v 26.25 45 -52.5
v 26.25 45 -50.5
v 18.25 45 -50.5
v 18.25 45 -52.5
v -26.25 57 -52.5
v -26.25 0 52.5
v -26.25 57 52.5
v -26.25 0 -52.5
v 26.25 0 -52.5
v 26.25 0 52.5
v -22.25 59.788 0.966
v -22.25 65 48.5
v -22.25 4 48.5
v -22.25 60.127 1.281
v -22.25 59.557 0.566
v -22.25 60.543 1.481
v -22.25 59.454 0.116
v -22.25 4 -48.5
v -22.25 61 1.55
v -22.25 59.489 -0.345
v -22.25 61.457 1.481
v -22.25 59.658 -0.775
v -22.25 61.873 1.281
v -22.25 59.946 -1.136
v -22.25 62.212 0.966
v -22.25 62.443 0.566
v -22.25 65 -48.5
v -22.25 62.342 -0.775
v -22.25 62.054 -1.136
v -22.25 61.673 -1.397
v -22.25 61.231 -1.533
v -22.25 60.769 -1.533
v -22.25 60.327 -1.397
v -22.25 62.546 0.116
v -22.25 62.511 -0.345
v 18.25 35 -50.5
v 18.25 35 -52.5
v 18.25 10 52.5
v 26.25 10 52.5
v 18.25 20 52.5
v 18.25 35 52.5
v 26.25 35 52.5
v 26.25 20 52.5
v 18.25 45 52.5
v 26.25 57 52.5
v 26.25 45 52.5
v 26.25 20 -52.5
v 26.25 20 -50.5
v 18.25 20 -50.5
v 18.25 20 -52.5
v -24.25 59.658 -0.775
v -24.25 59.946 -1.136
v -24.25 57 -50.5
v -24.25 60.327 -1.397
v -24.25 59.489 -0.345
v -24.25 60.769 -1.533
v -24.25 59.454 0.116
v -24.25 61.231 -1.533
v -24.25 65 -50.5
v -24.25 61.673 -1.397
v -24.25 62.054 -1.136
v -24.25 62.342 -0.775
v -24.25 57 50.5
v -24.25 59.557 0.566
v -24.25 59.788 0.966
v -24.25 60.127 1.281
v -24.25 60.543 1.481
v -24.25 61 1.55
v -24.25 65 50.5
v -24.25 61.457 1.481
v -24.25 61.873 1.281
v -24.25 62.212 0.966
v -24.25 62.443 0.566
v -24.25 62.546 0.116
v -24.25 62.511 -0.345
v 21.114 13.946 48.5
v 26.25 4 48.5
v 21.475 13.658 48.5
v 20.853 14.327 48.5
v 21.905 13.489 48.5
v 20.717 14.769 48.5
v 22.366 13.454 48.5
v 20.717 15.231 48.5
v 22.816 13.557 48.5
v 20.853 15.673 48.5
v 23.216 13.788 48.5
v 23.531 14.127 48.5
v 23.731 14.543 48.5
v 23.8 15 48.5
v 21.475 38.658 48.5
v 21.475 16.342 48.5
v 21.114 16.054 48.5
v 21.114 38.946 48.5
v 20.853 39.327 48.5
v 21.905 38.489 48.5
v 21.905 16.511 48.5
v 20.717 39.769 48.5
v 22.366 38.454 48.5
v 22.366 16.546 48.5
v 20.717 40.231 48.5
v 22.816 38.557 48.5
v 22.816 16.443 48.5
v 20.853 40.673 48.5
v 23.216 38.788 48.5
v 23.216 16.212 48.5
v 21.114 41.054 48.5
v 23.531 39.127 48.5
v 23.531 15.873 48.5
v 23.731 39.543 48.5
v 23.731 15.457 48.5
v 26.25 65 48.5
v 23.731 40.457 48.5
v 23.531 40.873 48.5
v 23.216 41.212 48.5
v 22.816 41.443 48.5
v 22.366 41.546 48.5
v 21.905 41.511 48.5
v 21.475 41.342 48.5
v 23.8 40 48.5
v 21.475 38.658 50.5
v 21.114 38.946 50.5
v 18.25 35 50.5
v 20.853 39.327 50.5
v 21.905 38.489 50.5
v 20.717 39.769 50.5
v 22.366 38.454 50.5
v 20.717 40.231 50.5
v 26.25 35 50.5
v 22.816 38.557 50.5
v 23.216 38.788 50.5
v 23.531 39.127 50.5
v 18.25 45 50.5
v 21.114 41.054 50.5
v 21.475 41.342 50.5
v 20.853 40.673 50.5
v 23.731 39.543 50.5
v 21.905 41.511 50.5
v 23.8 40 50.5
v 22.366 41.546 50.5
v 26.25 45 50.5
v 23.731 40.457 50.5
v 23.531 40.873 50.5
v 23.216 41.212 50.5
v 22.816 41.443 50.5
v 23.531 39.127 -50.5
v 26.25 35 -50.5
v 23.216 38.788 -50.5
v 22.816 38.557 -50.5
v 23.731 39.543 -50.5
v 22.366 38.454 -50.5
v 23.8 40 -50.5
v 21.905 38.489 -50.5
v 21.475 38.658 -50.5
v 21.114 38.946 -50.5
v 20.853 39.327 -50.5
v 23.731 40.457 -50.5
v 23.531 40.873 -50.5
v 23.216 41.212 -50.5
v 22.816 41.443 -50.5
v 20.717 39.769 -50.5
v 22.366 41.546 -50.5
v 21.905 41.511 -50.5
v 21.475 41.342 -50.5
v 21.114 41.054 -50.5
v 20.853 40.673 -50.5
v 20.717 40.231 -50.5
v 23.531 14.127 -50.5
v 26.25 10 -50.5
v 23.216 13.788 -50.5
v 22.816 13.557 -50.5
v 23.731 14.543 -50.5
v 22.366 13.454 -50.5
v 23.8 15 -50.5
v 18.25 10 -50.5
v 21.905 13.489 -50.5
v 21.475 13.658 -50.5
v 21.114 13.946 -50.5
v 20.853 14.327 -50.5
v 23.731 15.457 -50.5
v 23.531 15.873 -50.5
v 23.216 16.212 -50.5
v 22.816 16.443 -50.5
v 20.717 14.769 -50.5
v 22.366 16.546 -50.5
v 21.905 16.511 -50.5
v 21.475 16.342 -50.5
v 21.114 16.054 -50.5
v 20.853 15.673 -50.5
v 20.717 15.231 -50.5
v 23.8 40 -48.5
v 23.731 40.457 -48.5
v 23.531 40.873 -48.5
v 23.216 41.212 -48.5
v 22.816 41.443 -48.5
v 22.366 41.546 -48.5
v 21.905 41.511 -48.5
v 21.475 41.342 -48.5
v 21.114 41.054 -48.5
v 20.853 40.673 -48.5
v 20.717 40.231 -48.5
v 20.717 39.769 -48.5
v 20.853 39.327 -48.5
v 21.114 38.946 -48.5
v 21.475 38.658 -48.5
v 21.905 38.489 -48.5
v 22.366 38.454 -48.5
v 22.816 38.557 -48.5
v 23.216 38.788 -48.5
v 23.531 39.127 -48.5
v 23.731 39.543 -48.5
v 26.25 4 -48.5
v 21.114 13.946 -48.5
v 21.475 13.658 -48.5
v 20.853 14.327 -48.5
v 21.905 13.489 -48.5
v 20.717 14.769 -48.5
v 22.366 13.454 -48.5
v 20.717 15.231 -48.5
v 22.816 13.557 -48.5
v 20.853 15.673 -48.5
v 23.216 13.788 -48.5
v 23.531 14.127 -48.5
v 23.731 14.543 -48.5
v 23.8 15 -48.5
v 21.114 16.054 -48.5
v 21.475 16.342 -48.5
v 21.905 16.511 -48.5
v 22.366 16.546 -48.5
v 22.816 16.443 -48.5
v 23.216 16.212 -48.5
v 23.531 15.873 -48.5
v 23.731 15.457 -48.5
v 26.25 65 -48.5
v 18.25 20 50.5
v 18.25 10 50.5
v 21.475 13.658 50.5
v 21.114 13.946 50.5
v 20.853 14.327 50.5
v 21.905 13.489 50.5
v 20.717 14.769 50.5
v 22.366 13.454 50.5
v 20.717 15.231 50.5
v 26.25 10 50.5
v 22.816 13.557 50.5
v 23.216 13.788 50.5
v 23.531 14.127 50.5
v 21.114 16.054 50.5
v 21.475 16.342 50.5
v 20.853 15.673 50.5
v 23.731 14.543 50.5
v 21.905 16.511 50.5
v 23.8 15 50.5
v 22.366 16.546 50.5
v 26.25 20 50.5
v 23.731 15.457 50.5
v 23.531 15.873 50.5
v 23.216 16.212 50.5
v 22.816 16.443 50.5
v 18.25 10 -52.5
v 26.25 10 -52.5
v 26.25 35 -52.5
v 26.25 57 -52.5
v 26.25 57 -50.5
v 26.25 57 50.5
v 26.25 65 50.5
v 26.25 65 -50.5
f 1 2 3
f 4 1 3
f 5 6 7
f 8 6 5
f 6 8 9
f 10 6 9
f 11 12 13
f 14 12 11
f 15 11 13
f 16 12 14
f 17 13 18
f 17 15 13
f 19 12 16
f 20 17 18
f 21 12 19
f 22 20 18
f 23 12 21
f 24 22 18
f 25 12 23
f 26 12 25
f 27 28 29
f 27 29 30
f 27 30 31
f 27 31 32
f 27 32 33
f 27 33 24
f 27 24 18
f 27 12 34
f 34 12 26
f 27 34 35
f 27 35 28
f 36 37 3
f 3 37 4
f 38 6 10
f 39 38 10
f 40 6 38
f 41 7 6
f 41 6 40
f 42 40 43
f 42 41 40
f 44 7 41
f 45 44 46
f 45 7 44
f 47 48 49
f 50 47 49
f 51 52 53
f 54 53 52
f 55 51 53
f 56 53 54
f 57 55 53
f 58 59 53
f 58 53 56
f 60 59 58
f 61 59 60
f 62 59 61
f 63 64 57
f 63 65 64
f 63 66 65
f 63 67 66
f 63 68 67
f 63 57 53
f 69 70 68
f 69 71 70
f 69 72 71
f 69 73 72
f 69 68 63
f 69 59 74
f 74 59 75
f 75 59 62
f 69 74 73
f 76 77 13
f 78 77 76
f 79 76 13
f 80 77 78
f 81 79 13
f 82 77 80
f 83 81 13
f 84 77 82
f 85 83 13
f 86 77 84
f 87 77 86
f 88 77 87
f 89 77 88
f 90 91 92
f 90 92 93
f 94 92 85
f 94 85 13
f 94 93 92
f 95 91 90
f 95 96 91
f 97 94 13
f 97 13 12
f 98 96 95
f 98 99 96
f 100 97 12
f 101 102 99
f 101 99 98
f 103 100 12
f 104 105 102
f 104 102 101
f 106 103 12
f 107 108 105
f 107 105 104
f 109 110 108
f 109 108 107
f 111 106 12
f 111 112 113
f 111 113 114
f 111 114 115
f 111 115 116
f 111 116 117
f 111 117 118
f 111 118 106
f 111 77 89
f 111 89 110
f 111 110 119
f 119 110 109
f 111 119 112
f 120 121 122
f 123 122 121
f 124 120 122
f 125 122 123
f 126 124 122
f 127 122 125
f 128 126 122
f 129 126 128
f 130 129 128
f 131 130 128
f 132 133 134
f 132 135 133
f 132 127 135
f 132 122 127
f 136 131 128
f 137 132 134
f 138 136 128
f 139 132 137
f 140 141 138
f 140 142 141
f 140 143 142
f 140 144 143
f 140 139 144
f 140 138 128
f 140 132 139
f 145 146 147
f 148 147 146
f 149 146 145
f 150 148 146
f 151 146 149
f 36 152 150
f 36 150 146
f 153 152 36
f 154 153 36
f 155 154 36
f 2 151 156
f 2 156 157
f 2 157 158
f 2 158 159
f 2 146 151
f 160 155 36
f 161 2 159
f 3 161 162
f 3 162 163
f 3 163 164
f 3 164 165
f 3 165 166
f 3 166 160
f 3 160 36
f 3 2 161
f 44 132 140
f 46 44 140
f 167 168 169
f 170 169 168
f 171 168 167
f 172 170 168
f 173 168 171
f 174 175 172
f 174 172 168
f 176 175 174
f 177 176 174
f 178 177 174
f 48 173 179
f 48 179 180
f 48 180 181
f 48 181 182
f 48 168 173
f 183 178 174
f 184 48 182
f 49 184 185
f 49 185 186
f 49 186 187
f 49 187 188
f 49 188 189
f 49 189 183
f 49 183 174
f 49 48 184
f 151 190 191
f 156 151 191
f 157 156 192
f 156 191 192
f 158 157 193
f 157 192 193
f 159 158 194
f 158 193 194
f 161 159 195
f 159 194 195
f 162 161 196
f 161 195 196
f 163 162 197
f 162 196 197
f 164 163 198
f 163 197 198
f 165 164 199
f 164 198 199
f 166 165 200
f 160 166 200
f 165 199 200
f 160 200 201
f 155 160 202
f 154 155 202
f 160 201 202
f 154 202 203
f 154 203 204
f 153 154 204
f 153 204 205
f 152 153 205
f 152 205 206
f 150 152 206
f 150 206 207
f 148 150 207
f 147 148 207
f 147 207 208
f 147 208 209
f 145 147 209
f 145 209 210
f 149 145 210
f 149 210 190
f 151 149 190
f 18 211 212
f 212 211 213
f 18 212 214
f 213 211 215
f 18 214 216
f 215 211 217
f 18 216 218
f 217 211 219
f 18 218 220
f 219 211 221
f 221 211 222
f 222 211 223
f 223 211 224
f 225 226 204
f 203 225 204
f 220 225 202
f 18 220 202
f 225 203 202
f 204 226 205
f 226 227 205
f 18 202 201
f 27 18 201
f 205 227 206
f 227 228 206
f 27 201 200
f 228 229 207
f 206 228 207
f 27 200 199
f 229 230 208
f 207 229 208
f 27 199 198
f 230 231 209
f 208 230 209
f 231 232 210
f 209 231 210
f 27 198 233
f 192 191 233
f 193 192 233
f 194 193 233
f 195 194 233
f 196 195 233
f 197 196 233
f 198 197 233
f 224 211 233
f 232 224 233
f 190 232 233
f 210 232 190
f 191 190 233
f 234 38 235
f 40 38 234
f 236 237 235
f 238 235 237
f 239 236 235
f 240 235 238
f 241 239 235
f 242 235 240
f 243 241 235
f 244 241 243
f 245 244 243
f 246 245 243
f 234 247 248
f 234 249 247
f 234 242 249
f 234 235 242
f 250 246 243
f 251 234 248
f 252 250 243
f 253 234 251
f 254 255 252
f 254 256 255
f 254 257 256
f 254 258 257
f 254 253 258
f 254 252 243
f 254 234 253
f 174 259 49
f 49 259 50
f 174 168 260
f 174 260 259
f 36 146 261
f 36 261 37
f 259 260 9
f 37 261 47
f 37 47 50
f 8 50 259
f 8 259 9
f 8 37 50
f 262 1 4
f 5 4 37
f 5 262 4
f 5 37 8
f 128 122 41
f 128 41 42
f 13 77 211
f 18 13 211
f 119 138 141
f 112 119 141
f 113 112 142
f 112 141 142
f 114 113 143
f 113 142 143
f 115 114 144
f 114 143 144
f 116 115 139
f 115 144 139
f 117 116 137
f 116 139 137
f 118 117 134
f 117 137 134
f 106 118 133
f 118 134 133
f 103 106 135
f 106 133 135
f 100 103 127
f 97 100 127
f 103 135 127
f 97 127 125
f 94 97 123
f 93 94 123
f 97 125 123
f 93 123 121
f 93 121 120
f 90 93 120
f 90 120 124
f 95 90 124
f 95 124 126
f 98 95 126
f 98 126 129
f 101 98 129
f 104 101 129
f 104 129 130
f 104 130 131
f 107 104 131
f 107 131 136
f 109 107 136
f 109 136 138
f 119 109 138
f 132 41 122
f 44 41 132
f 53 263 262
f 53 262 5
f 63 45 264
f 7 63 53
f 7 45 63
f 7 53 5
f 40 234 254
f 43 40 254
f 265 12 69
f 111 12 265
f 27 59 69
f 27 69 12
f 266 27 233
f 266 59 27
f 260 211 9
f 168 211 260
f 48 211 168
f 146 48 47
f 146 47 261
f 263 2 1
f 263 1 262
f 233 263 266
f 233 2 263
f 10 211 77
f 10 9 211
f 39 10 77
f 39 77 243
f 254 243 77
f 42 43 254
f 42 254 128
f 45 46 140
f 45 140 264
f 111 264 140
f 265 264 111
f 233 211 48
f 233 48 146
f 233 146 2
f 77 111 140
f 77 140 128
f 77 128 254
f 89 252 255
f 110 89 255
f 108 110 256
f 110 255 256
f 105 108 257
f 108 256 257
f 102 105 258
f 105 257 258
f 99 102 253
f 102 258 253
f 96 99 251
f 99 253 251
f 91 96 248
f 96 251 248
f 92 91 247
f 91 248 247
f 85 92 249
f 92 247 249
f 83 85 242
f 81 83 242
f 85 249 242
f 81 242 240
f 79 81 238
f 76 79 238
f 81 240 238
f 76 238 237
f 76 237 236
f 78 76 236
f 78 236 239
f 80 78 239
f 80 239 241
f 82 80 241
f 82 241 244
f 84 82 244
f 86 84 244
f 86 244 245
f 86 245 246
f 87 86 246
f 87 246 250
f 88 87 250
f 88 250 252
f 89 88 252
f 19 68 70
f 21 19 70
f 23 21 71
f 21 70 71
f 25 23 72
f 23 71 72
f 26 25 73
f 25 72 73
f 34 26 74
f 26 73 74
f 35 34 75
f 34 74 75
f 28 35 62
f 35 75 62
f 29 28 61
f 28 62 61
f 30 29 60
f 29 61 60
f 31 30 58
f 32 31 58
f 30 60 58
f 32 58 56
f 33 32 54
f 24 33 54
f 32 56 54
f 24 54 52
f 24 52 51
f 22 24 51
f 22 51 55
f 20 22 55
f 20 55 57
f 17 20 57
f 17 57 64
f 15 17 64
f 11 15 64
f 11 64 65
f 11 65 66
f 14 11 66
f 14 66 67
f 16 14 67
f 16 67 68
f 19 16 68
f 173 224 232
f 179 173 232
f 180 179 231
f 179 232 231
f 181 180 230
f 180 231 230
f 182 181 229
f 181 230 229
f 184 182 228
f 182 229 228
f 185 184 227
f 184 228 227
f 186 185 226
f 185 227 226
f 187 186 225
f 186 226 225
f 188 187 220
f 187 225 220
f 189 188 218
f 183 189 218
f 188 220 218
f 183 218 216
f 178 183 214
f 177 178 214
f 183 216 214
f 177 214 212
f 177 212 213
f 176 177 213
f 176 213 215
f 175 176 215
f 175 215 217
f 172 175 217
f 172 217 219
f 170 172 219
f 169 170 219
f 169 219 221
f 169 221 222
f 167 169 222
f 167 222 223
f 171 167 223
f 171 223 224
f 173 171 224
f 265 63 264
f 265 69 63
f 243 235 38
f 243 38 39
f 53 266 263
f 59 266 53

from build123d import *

# Parameters (mm, degrees)
SKETCH1_W           = 52.5
SKETCH1_H           = 105
BOSS_EXTRUDE1_DEPTH = 65
SKETCH2_W           = 97
SKETCH2_H           = 61
CUT_EXTRUDE1_DEPTH  = 48.5
SKETCH4_W           = 8
SKETCH4_H           = 57
CUT_EXTRUDE2_DEPTH  = 2
SKETCH5_W           = 8
SKETCH5_H           = 57
CUT_EXTRUDE3_DEPTH  = 2
SKETCH7_W           = 101
SKETCH7_H           = 8
CUT_EXTRUDE5_DEPTH  = 2
CUT_EXTRUDE6_REACH  = 52.5
SKETCH9_R           = 1.55
SKETCH10_R          = 1.55
CUT_EXTRUDE7_DEPTH  = 104
SKETCH12_W          = 8
SKETCH12_H          = 12
SKETCH12_H_2        = 10
SKETCH12_H_3        = 15
BOSS_EXTRUDE2_DEPTH = 2
SKETCH13_W          = 8
SKETCH13_H          = 12
SKETCH13_H_2        = 15
SKETCH13_H_3        = 10
BOSS_EXTRUDE3_DEPTH = 2


with BuildPart() as part:
    # Sketch1 → Boss-Extrude1 (new body)
    with BuildSketch(Plane(origin=(0, 0, 0), x_dir=(1, 0, 0), z_dir=(0, 1, 0))):
        Rectangle(SKETCH1_W, SKETCH1_H)
    extrude(amount=BOSS_EXTRUDE1_DEPTH)

    # Sketch2 → Cut-Extrude1 (cut)
    with BuildSketch(Plane(origin=(26.25, 0, 0), x_dir=(0, 0, -1), z_dir=(1, 0, 0))):
        with Locations((0, 34.5)):
            Rectangle(SKETCH2_W, SKETCH2_H)
    extrude(amount=-CUT_EXTRUDE1_DEPTH, mode=Mode.SUBTRACT)

    # Sketch4 → Cut-Extrude2 (cut)
    with BuildSketch(Plane(origin=(0, 0, -52.5), x_dir=(-1, 0, 0), z_dir=(0, 0, -1))):
        with Locations((-22.25, 28.5)):
            Rectangle(SKETCH4_W, SKETCH4_H)
        Polygon((26.25, 65), (-26.25, 65), (-26.25, 57), (-18.25, 57), (26.25, 57), align=None)
    extrude(amount=-CUT_EXTRUDE2_DEPTH, mode=Mode.SUBTRACT)

    # Sketch5 → Cut-Extrude3 (cut)
    with BuildSketch(Plane.XY.offset(52.5)):
        Polygon((26.25, 57), (26.25, 65), (-26.25, 65), (-26.25, 57), (18.25, 57), align=None)
        with Locations((22.25, 28.5)):
            Rectangle(SKETCH5_W, SKETCH5_H)
    extrude(amount=-CUT_EXTRUDE3_DEPTH, mode=Mode.SUBTRACT)

    # Sketch7 → Cut-Extrude5 (cut)
    with BuildSketch(Plane.ZY.offset(26.25)):
        with Locations((0, 61)):
            Rectangle(SKETCH7_W, SKETCH7_H)
    extrude(amount=-CUT_EXTRUDE5_DEPTH, mode=Mode.SUBTRACT)

    # Sketch9 → Cut-Extrude6 (cut, up to next)
    with BuildSketch(Plane.ZY.offset(24.25), mode=Mode.PRIVATE) as cut_extrude6_sk1:
        with Locations((0, 61)):
            Circle(SKETCH9_R)
    cut_extrude6_tool1 = extrude(cut_extrude6_sk1.sketch, amount=-CUT_EXTRUDE6_REACH, mode=Mode.PRIVATE) & part.part
    add(cut_extrude6_tool1.solids().sort_by_distance((-24.25, 61, 0))[0], mode=Mode.SUBTRACT)

    # Sketch10 → Cut-Extrude7 (cut, through all)
    with BuildSketch(Plane.XY.offset(50.5)):
        with Locations((22.25, 15)):
            Circle(SKETCH10_R)
        with Locations((22.25, 40)):
            Circle(SKETCH10_R)
    extrude(amount=-CUT_EXTRUDE7_DEPTH, mode=Mode.SUBTRACT)

    # Sketch12 → Boss-Extrude2 (add)
    with BuildSketch(Plane.XY.offset(50.5)):
        with Locations((22.25, 51)):
            Rectangle(SKETCH12_W, SKETCH12_H)
        with Locations((22.25, 5)):
            Rectangle(SKETCH12_W, SKETCH12_H_2)
        with Locations((22.25, 27.5)):
            Rectangle(SKETCH12_W, SKETCH12_H_3)
    extrude(amount=BOSS_EXTRUDE2_DEPTH)

    # Sketch13 → Boss-Extrude3 (add)
    with BuildSketch(Plane(origin=(0, 0, -50.5), x_dir=(-1, 0, 0), z_dir=(0, 0, -1))):
        with Locations((-22.25, 51)):
            Rectangle(SKETCH13_W, SKETCH13_H)
        with Locations((-22.25, 27.5)):
            Rectangle(SKETCH13_W, SKETCH13_H_2)
        with Locations((-22.25, 5)):
            Rectangle(SKETCH13_W, SKETCH13_H_3)
    extrude(amount=BOSS_EXTRUDE3_DEPTH)


solid = part.part
